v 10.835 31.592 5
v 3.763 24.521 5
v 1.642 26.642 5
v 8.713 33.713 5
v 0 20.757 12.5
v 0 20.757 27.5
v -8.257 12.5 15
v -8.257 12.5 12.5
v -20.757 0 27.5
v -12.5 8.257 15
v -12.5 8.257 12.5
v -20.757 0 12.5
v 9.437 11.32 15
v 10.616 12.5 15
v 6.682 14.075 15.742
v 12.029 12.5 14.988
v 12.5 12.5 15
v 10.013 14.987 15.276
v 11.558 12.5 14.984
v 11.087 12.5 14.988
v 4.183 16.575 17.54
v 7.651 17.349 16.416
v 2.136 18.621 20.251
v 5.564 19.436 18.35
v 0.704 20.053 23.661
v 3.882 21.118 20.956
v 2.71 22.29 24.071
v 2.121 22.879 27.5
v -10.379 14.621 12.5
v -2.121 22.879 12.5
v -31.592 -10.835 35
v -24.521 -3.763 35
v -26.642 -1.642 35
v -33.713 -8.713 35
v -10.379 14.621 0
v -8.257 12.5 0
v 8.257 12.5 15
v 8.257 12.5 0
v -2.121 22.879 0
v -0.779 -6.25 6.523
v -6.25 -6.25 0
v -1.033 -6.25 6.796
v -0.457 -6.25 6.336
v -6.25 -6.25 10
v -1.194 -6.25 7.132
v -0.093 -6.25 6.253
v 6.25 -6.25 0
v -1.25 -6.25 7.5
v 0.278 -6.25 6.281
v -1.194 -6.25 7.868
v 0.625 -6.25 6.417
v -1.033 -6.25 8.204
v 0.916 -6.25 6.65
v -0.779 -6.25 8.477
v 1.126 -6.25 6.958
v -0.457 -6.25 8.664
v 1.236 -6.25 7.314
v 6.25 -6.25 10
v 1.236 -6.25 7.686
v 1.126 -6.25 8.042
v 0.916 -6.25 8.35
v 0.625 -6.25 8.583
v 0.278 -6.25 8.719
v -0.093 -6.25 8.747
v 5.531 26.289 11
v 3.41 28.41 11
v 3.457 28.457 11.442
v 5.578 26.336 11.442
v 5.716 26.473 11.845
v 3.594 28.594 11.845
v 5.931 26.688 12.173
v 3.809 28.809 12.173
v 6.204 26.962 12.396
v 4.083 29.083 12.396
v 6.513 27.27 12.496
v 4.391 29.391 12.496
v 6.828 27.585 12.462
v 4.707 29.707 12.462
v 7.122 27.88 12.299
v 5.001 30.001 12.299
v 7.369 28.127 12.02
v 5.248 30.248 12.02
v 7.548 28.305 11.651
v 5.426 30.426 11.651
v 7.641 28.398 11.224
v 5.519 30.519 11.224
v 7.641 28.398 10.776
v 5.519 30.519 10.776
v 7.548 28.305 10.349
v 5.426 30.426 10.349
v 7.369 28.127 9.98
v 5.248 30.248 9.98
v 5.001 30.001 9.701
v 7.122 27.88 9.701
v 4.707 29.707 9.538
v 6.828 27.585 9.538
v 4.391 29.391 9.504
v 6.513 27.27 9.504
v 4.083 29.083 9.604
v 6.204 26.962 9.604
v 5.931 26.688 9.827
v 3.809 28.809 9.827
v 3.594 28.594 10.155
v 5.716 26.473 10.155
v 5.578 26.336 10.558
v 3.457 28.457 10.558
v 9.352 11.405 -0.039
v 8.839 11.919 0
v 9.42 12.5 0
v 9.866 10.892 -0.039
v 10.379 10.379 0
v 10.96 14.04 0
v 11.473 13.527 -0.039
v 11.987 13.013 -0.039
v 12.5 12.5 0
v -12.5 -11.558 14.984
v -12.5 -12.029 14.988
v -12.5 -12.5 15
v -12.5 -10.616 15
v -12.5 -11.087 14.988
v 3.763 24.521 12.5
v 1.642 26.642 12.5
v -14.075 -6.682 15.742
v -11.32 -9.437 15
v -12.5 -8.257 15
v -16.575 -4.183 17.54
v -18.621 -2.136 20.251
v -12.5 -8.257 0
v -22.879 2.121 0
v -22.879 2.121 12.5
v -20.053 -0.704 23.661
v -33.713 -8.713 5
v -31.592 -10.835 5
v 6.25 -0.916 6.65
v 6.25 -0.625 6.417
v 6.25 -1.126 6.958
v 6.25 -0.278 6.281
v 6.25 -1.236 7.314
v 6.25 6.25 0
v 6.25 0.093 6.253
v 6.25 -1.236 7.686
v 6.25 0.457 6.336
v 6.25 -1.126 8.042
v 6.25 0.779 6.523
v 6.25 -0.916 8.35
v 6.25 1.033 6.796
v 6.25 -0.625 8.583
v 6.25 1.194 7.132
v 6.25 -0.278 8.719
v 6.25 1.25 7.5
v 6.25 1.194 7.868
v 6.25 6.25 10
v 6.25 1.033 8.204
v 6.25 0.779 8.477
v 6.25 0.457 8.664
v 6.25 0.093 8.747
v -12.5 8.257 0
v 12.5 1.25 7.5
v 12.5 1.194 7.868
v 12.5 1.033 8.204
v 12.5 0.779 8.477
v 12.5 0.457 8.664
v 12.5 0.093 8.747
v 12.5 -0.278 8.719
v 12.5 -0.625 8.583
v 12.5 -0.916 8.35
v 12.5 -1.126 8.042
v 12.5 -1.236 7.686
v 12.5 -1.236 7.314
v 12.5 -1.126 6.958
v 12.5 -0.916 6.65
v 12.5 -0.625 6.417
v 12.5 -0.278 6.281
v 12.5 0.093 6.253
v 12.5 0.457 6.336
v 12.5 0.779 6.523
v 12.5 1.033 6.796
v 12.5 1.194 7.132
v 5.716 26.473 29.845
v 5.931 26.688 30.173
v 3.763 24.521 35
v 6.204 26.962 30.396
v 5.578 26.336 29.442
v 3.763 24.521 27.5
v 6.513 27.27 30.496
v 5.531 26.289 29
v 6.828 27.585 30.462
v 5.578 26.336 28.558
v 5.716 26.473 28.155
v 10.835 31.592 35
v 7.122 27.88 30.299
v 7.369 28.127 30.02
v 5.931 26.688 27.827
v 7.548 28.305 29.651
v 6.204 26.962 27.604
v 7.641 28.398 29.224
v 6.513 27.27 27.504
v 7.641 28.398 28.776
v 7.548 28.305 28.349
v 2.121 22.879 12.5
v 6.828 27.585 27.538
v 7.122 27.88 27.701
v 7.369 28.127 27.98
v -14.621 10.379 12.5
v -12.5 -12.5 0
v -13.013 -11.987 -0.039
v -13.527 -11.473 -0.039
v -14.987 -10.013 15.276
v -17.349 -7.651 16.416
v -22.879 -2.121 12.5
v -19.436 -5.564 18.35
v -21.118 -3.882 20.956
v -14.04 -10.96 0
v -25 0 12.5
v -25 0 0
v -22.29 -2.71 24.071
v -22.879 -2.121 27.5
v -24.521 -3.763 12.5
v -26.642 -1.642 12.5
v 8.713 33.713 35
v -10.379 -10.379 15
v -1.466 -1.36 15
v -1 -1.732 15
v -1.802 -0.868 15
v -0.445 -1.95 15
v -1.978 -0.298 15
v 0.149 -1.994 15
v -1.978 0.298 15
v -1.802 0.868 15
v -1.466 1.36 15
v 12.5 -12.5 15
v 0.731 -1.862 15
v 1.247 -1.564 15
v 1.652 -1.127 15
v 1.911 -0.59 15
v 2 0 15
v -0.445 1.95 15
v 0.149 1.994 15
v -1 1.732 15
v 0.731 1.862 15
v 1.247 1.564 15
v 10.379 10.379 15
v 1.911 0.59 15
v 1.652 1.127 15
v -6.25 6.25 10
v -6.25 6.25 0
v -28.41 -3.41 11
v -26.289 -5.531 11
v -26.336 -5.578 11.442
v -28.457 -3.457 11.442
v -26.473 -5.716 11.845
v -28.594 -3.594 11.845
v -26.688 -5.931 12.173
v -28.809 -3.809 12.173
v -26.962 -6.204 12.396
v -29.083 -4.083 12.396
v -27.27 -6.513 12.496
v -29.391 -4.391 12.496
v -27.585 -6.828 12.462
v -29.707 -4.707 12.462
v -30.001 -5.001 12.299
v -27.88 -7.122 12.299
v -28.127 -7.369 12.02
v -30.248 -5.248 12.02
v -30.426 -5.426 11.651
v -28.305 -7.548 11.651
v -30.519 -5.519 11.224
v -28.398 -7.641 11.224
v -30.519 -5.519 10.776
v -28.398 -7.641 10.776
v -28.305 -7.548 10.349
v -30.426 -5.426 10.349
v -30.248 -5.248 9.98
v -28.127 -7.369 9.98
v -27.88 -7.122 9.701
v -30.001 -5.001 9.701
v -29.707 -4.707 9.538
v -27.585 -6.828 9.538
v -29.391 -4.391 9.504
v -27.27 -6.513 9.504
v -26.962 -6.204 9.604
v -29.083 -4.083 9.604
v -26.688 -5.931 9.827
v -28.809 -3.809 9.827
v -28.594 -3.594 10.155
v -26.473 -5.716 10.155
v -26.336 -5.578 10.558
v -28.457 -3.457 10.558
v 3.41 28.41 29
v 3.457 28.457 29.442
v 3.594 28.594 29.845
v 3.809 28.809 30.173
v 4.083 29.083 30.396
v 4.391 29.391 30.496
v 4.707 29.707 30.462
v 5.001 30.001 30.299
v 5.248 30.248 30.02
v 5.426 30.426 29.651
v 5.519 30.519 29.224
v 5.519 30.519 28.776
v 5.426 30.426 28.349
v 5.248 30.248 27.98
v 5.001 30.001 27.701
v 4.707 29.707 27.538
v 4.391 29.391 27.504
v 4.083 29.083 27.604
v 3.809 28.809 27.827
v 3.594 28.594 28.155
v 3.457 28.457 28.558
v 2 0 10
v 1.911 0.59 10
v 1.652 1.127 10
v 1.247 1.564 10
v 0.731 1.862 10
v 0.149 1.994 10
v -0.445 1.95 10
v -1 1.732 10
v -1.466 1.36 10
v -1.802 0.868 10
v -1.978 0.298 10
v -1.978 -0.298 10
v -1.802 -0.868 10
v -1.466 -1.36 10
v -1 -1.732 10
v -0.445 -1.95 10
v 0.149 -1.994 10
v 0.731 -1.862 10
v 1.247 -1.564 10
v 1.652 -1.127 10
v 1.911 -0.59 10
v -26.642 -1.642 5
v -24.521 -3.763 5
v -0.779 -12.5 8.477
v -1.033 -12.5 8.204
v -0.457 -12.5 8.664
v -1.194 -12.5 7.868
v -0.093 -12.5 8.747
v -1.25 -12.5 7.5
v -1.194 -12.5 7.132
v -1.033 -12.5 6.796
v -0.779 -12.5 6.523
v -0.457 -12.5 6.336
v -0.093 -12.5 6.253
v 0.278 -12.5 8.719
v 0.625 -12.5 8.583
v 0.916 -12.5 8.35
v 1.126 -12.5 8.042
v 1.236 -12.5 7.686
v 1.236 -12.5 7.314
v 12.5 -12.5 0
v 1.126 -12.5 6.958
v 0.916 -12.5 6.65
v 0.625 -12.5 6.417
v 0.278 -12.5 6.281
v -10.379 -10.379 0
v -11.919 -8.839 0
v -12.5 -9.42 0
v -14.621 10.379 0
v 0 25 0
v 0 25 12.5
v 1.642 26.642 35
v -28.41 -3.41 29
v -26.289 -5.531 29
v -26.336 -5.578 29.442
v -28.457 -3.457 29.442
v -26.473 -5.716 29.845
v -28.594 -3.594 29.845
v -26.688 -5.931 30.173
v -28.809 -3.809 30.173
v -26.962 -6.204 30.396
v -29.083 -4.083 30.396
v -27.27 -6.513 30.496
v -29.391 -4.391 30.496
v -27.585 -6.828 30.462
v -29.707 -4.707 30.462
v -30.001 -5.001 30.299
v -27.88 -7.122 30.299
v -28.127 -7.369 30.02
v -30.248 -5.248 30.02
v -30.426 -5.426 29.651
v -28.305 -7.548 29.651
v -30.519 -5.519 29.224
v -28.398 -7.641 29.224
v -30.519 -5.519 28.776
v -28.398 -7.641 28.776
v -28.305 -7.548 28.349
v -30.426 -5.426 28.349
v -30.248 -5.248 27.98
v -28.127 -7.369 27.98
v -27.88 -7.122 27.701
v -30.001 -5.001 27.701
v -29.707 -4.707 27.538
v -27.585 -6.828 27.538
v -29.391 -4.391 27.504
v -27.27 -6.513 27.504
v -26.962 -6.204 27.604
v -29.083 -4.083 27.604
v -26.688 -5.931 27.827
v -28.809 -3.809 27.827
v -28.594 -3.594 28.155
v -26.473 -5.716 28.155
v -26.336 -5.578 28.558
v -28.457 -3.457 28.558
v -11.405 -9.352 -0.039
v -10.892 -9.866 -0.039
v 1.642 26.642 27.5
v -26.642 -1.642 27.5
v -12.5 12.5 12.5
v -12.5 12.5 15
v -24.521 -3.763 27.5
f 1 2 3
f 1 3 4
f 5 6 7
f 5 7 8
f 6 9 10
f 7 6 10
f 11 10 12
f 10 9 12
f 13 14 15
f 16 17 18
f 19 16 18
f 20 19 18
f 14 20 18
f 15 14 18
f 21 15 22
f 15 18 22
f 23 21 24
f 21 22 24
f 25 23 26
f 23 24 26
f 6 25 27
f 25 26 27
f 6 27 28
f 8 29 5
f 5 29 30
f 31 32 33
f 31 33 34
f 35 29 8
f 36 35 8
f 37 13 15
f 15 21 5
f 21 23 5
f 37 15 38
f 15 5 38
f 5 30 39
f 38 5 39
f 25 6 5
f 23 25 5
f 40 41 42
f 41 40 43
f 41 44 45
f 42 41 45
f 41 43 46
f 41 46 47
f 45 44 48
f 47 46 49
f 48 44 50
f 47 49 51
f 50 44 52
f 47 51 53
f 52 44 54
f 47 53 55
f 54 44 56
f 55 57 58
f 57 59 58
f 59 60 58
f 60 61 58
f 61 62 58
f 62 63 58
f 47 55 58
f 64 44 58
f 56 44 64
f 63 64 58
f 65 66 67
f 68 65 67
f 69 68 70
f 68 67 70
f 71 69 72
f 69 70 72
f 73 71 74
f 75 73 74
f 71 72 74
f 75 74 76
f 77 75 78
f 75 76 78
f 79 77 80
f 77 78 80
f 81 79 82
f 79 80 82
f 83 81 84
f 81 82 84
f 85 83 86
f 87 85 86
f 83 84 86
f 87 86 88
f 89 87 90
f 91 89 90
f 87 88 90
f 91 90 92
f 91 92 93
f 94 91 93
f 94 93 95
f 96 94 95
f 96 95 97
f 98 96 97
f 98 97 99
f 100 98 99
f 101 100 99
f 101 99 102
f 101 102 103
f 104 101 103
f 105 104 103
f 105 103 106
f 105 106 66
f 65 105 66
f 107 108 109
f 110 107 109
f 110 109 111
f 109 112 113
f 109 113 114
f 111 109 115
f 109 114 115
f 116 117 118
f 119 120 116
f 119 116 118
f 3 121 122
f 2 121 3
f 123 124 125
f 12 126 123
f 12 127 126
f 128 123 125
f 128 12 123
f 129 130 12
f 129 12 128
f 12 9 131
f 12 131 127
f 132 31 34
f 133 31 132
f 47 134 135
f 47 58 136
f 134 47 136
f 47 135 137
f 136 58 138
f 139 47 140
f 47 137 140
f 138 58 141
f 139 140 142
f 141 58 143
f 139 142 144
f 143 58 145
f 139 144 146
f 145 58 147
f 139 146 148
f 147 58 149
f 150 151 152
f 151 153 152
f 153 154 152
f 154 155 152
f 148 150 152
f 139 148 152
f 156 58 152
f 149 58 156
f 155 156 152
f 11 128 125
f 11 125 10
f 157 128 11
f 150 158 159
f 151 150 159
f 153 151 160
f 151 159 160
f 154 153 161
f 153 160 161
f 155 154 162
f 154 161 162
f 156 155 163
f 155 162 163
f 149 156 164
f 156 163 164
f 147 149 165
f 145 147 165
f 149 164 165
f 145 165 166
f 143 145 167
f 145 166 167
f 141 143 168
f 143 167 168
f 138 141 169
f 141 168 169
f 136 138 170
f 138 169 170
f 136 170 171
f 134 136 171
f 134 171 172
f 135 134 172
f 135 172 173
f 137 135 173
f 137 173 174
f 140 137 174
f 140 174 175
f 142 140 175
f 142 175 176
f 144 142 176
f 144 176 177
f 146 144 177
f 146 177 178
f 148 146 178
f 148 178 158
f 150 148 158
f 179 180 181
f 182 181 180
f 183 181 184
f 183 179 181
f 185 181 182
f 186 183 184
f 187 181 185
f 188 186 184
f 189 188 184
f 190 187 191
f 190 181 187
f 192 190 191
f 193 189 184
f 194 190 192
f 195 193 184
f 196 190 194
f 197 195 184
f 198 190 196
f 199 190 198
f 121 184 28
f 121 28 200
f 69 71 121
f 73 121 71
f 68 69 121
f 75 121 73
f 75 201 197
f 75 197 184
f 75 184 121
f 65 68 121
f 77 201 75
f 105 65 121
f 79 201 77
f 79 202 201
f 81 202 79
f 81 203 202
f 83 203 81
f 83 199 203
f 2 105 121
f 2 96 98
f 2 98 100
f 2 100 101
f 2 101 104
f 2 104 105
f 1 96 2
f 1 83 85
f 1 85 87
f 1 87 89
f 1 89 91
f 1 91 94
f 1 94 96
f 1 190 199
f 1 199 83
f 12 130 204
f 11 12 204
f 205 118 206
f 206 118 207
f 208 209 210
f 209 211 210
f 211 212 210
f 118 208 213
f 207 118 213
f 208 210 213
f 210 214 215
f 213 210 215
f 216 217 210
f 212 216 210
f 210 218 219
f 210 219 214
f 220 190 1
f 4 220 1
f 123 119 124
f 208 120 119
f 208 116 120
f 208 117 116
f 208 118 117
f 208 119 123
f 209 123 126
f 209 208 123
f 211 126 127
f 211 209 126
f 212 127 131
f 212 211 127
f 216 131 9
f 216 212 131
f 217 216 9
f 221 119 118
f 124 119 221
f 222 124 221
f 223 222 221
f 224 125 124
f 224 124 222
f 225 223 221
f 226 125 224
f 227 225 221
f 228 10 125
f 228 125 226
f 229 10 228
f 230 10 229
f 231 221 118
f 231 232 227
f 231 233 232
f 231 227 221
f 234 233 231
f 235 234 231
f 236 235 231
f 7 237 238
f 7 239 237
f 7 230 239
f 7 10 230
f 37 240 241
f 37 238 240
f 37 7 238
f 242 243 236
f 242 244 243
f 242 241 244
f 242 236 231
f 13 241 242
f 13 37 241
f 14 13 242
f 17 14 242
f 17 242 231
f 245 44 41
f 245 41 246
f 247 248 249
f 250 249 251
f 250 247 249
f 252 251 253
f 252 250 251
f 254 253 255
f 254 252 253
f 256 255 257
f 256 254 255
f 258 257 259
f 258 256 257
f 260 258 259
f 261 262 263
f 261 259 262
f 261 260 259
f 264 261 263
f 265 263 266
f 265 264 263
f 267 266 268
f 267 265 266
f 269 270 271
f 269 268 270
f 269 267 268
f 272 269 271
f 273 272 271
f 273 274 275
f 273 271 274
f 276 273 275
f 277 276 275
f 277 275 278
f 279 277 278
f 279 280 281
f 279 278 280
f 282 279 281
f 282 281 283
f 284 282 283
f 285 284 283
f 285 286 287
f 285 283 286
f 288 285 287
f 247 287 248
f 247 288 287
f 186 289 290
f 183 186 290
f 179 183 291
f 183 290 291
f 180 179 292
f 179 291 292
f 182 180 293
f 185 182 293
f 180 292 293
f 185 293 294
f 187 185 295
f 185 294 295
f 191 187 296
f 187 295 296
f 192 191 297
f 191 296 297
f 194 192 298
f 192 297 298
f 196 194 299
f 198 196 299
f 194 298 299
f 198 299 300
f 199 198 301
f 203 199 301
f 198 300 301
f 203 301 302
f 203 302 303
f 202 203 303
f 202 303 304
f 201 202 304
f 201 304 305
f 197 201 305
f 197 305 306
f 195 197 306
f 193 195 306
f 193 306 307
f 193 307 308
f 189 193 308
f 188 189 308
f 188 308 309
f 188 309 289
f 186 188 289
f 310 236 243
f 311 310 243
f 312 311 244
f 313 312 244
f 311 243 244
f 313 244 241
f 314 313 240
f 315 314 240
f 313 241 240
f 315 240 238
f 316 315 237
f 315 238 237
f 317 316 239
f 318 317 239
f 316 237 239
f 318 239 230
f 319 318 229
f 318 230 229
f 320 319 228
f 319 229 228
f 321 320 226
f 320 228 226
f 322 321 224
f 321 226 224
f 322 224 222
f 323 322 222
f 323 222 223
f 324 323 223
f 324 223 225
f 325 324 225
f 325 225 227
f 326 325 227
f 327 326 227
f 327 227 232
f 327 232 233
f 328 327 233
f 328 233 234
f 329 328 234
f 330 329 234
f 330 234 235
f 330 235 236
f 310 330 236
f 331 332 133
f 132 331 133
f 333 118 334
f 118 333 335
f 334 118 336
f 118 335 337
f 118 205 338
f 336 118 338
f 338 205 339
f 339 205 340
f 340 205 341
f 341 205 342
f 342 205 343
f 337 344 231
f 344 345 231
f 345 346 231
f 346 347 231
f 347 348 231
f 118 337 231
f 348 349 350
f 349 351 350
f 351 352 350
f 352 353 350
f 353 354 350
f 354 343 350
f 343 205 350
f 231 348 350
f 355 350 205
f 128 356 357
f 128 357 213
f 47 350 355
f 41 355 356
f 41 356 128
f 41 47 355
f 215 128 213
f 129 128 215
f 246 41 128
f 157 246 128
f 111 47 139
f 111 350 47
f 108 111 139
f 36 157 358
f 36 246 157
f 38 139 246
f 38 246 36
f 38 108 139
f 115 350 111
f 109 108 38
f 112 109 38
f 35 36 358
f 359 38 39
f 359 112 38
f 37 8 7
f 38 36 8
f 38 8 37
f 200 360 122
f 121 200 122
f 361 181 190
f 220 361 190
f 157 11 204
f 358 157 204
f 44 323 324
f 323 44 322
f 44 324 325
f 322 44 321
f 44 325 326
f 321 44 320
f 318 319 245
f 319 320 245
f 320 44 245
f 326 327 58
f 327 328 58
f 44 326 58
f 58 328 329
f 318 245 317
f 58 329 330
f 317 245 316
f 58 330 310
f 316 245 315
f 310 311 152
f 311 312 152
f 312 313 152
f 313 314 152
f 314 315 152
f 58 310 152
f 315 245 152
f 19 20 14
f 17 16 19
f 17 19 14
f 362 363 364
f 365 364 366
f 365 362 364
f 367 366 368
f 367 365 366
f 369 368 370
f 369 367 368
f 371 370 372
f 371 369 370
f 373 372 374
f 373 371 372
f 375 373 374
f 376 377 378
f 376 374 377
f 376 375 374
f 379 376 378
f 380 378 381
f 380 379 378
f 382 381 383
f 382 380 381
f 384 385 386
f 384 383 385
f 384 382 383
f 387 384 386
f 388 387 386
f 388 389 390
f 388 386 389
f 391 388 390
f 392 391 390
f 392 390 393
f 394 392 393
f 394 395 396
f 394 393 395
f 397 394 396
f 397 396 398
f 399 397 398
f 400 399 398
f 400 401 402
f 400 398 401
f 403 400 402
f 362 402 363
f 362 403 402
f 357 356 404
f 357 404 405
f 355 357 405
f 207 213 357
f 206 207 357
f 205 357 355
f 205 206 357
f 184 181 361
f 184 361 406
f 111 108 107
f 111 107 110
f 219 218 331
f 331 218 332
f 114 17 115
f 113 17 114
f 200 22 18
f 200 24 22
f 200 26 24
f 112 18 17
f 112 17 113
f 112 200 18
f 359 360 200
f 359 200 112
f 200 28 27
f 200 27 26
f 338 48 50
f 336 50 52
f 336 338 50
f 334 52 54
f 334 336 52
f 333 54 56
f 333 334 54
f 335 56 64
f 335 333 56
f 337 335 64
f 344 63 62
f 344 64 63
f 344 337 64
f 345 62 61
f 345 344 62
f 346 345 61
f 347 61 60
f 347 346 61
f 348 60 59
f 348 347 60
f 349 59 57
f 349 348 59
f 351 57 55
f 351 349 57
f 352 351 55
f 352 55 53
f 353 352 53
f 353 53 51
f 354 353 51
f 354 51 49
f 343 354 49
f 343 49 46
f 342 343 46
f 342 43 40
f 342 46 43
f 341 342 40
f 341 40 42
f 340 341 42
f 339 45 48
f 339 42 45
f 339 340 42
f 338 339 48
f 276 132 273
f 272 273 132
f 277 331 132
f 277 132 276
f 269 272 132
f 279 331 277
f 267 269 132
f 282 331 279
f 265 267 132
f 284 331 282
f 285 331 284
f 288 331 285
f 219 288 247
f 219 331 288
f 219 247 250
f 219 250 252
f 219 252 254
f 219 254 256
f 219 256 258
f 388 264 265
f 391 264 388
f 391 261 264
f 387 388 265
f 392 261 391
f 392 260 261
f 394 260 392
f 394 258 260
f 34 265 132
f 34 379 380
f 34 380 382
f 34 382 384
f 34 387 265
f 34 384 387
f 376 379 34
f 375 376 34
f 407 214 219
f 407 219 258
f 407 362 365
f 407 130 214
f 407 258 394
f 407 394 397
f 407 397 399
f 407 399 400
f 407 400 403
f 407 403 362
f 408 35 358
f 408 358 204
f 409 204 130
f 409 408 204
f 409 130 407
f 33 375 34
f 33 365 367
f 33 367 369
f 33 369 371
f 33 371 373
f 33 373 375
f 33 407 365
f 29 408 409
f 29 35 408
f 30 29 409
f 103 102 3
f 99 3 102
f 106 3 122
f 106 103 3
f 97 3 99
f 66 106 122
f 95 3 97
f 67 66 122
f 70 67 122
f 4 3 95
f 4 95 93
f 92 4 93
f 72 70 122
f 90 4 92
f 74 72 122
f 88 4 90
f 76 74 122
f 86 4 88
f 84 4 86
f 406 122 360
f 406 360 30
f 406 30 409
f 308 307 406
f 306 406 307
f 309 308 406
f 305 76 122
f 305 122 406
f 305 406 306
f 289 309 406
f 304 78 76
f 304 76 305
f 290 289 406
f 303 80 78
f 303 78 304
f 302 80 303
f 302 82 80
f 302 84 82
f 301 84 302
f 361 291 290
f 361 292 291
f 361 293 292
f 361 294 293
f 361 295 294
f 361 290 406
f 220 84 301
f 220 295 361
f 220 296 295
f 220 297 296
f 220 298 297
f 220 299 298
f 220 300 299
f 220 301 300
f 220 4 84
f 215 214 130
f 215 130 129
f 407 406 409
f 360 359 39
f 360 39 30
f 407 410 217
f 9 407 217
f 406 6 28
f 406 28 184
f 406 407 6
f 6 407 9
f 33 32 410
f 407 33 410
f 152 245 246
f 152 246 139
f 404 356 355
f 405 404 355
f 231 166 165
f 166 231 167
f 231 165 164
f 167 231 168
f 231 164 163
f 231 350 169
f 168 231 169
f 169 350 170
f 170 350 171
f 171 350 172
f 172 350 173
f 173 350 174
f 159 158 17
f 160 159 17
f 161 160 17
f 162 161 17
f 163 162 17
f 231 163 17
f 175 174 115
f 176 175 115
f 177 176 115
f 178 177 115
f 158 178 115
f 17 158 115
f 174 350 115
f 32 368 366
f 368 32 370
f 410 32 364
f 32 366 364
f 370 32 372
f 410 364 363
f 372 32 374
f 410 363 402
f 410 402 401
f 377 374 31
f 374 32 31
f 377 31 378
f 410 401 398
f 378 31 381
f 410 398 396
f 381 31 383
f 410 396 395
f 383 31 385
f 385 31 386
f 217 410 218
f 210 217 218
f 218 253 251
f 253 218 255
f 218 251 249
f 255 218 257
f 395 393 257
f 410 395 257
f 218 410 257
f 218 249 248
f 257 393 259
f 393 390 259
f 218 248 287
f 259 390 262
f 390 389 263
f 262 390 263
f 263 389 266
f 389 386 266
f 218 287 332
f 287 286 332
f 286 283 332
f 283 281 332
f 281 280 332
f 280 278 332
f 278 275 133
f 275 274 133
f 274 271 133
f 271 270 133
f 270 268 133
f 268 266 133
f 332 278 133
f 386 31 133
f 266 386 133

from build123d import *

# Parameters (mm, degrees)
SKETCH_1_W          = 25
SKETCH_1_H          = 25
EXTRUDE_1_DEPTH     = 10
SKETCH_2_W          = 12.5
SKETCH_2_H          = 12.5
CUT_EXTRUDE_1_DEPTH = 21.310096012
SKETCH_3_W          = 25
SKETCH_3_H          = 25
EXTRUDE_2_DEPTH     = 5
SKETCH_4_R          = 2
CUT_EXTRUDE_2_DEPTH = 24.184046239
SKETCH_5_W          = 15
SKETCH_5_H          = 40
EXTRUDE_3_DEPTH     = 3
SKETCH_9_W          = 30
SKETCH_9_H          = 10
EXTRUDE_7_DEPTH     = 3
SKETCH_11_R         = 1.5
CUT_EXTRUDE_3_DEPTH = 50.749371855
EXTRUDE_8_DEPTH     = 12.5
EXTRUDE_9_DEPTH     = 3
SKETCH_15_R         = 1.25
CUT_EXTRUDE_4_DEPTH = 10
EXTRUDE_START       = -3
EXTRUDE_10_DEPTH    = 3


# Read off the part's stored shape, not the designer's step: 凸台-拉伸10
with BuildPart() as part:
    # 草图1 → 凸台-拉伸1 (new body)
    with BuildSketch(Plane.XY):
        Rectangle(SKETCH_1_W, SKETCH_1_H)
    extrude(amount=EXTRUDE_1_DEPTH)

    # 草图2 → 切除-拉伸1 (cut, through all)
    with BuildSketch(Plane.XY.offset(10)):
        Rectangle(SKETCH_2_W, SKETCH_2_H)
    extrude(amount=-CUT_EXTRUDE_1_DEPTH, mode=Mode.SUBTRACT)

    # 草图3 → 凸台-拉伸2 (add)
    with BuildSketch(Plane.XY.offset(10)):
        Rectangle(SKETCH_3_W, SKETCH_3_H)
    extrude(amount=EXTRUDE_2_DEPTH)

    # 草图4 → 切除-拉伸2 (cut, through all)
    with BuildSketch(Plane.XY.offset(15)):
        Circle(SKETCH_4_R)
    extrude(amount=-CUT_EXTRUDE_2_DEPTH, mode=Mode.SUBTRACT)

    # 草图5 → 凸台-拉伸3 (add)
    with BuildSketch(Plane(origin=(-12.5, 12.5, 0), x_dir=(0, 0, -1), z_dir=(0.7071067811865477, -0.7071067811865474, 0))):
        with Locations((-20, 0)):
            Rectangle(SKETCH_5_W, SKETCH_5_H)
    extrude(amount=EXTRUDE_3_DEPTH)

    # 草图9 → 凸台-拉伸7 (add)
    with BuildSketch(Plane(origin=(-10.378679656, 10.378679656, 0), x_dir=(0, 0, -1), z_dir=(0.7071067811865477, -0.7071067811865474, 0))):
        with Locations((-20, 25)):
            Rectangle(SKETCH_9_W, SKETCH_9_H)
    extrude_7 = extrude(amount=-EXTRUDE_7_DEPTH)

    # 草图11 → 切除-拉伸3 (cut, through all)
    with BuildSketch(Plane(origin=(-12.5, 12.5, 0), x_dir=(0, 0, 1), z_dir=(-0.7071067811865477, 0.7071067811865474, 0))):
        with Locations(Location((11, 24, 0), (0, 0, 270))):
            Circle(SKETCH_11_R)
        with Locations(Location((29, 24, 0), (0, 0, 270))):
            Circle(SKETCH_11_R)
    cut_extrude_3 = extrude(amount=-CUT_EXTRUDE_3_DEPTH, mode=Mode.SUBTRACT)

    # 草图12 → 凸台-拉伸8 (add)
    with BuildSketch(Plane(origin=(0, 0, 12.5), x_dir=(-1, 0, 0), z_dir=(0, 0, -1))):
        Polygon((8.257359313, 12.5), (12.5, 8.257359313), (14.621320344, 10.378679656), (10.378679656, 14.621320344), align=None)
    extrude(amount=EXTRUDE_8_DEPTH)

    # 草图13 → 凸台-拉伸9 (add)
    with BuildSketch(Plane(origin=(12.5, 12.5, 0), x_dir=(0, 0, -1), z_dir=(-0.7071067811865474, -0.7071067811865477, 0))):
        with BuildLine():
            Line((-27.5, -14.67766953), (-12.5, -14.67766953))
            ThreePointArc((-12.5, -14.67766953), (-3.210155108, -9.92766953), (0, 0))
            Line((0, 0), (-15, 0))
            ThreePointArc((-15, 0), (-18.349852274, -9.808698696), (-27.5, -14.67766953))
        make_face()
    extrude_9 = extrude(amount=EXTRUDE_9_DEPTH)

    # 草图15 → 切除-拉伸4 (cut)
    with BuildSketch(Plane(origin=(12.5, 0, 0), x_dir=(0, 0, -1), z_dir=(1, 0, 0))):
        with Locations(Location((-7.5, 0, 0), (0, 0, 90))):
            Circle(SKETCH_15_R)
    cut_extrude_4 = extrude(amount=-CUT_EXTRUDE_4_DEPTH, mode=Mode.SUBTRACT)

    # 凸台-拉伸10 outline → 凸台-拉伸10 (add)
    with BuildSketch(Plane(origin=(12.5, 12.5, 0), x_dir=(0, 0, -1), z_dir=(0.7071067811865474, 0.7071067811865477, 0)).offset(EXTRUDE_START)):
        with BuildLine():
            ThreePointArc((-12.5, 14.67766953), (-3.949281056, 10.728388475), (0, 2.177669532))
            Line((0, 2.177669532), (0, 17.67766953))
            Line((0, 17.67766953), (-12.5, 17.67766953))
            Line((-12.5, 17.67766953), (-12.5, 14.67766953))
        make_face()
    extrude_10 = extrude(amount=EXTRUDE_10_DEPTH)

    # 镜向3: 凸台-拉伸7, 切除-拉伸3, 凸台-拉伸9, 切除-拉伸4, 凸台-拉伸10 across plane
    add(extrude_7.mirror(Plane(origin=(0, 0, 0), x_dir=(0, 0, 1), z_dir=(-0.7071067811865474, -0.7071067811865477, 0))))
    add(cut_extrude_3.mirror(Plane(origin=(0, 0, 0), x_dir=(0, 0, 1), z_dir=(-0.7071067811865474, -0.7071067811865477, 0))), mode=Mode.SUBTRACT)
    add(extrude_9.mirror(Plane(origin=(0, 0, 0), x_dir=(0, 0, 1), z_dir=(-0.7071067811865474, -0.7071067811865477, 0))))
    add(cut_extrude_4.mirror(Plane(origin=(0, 0, 0), x_dir=(0, 0, 1), z_dir=(-0.7071067811865474, -0.7071067811865477, 0))), mode=Mode.SUBTRACT)
    add(extrude_10.mirror(Plane(origin=(0, 0, 0), x_dir=(0, 0, 1), z_dir=(-0.7071067811865474, -0.7071067811865477, 0))))


solid = part.part
